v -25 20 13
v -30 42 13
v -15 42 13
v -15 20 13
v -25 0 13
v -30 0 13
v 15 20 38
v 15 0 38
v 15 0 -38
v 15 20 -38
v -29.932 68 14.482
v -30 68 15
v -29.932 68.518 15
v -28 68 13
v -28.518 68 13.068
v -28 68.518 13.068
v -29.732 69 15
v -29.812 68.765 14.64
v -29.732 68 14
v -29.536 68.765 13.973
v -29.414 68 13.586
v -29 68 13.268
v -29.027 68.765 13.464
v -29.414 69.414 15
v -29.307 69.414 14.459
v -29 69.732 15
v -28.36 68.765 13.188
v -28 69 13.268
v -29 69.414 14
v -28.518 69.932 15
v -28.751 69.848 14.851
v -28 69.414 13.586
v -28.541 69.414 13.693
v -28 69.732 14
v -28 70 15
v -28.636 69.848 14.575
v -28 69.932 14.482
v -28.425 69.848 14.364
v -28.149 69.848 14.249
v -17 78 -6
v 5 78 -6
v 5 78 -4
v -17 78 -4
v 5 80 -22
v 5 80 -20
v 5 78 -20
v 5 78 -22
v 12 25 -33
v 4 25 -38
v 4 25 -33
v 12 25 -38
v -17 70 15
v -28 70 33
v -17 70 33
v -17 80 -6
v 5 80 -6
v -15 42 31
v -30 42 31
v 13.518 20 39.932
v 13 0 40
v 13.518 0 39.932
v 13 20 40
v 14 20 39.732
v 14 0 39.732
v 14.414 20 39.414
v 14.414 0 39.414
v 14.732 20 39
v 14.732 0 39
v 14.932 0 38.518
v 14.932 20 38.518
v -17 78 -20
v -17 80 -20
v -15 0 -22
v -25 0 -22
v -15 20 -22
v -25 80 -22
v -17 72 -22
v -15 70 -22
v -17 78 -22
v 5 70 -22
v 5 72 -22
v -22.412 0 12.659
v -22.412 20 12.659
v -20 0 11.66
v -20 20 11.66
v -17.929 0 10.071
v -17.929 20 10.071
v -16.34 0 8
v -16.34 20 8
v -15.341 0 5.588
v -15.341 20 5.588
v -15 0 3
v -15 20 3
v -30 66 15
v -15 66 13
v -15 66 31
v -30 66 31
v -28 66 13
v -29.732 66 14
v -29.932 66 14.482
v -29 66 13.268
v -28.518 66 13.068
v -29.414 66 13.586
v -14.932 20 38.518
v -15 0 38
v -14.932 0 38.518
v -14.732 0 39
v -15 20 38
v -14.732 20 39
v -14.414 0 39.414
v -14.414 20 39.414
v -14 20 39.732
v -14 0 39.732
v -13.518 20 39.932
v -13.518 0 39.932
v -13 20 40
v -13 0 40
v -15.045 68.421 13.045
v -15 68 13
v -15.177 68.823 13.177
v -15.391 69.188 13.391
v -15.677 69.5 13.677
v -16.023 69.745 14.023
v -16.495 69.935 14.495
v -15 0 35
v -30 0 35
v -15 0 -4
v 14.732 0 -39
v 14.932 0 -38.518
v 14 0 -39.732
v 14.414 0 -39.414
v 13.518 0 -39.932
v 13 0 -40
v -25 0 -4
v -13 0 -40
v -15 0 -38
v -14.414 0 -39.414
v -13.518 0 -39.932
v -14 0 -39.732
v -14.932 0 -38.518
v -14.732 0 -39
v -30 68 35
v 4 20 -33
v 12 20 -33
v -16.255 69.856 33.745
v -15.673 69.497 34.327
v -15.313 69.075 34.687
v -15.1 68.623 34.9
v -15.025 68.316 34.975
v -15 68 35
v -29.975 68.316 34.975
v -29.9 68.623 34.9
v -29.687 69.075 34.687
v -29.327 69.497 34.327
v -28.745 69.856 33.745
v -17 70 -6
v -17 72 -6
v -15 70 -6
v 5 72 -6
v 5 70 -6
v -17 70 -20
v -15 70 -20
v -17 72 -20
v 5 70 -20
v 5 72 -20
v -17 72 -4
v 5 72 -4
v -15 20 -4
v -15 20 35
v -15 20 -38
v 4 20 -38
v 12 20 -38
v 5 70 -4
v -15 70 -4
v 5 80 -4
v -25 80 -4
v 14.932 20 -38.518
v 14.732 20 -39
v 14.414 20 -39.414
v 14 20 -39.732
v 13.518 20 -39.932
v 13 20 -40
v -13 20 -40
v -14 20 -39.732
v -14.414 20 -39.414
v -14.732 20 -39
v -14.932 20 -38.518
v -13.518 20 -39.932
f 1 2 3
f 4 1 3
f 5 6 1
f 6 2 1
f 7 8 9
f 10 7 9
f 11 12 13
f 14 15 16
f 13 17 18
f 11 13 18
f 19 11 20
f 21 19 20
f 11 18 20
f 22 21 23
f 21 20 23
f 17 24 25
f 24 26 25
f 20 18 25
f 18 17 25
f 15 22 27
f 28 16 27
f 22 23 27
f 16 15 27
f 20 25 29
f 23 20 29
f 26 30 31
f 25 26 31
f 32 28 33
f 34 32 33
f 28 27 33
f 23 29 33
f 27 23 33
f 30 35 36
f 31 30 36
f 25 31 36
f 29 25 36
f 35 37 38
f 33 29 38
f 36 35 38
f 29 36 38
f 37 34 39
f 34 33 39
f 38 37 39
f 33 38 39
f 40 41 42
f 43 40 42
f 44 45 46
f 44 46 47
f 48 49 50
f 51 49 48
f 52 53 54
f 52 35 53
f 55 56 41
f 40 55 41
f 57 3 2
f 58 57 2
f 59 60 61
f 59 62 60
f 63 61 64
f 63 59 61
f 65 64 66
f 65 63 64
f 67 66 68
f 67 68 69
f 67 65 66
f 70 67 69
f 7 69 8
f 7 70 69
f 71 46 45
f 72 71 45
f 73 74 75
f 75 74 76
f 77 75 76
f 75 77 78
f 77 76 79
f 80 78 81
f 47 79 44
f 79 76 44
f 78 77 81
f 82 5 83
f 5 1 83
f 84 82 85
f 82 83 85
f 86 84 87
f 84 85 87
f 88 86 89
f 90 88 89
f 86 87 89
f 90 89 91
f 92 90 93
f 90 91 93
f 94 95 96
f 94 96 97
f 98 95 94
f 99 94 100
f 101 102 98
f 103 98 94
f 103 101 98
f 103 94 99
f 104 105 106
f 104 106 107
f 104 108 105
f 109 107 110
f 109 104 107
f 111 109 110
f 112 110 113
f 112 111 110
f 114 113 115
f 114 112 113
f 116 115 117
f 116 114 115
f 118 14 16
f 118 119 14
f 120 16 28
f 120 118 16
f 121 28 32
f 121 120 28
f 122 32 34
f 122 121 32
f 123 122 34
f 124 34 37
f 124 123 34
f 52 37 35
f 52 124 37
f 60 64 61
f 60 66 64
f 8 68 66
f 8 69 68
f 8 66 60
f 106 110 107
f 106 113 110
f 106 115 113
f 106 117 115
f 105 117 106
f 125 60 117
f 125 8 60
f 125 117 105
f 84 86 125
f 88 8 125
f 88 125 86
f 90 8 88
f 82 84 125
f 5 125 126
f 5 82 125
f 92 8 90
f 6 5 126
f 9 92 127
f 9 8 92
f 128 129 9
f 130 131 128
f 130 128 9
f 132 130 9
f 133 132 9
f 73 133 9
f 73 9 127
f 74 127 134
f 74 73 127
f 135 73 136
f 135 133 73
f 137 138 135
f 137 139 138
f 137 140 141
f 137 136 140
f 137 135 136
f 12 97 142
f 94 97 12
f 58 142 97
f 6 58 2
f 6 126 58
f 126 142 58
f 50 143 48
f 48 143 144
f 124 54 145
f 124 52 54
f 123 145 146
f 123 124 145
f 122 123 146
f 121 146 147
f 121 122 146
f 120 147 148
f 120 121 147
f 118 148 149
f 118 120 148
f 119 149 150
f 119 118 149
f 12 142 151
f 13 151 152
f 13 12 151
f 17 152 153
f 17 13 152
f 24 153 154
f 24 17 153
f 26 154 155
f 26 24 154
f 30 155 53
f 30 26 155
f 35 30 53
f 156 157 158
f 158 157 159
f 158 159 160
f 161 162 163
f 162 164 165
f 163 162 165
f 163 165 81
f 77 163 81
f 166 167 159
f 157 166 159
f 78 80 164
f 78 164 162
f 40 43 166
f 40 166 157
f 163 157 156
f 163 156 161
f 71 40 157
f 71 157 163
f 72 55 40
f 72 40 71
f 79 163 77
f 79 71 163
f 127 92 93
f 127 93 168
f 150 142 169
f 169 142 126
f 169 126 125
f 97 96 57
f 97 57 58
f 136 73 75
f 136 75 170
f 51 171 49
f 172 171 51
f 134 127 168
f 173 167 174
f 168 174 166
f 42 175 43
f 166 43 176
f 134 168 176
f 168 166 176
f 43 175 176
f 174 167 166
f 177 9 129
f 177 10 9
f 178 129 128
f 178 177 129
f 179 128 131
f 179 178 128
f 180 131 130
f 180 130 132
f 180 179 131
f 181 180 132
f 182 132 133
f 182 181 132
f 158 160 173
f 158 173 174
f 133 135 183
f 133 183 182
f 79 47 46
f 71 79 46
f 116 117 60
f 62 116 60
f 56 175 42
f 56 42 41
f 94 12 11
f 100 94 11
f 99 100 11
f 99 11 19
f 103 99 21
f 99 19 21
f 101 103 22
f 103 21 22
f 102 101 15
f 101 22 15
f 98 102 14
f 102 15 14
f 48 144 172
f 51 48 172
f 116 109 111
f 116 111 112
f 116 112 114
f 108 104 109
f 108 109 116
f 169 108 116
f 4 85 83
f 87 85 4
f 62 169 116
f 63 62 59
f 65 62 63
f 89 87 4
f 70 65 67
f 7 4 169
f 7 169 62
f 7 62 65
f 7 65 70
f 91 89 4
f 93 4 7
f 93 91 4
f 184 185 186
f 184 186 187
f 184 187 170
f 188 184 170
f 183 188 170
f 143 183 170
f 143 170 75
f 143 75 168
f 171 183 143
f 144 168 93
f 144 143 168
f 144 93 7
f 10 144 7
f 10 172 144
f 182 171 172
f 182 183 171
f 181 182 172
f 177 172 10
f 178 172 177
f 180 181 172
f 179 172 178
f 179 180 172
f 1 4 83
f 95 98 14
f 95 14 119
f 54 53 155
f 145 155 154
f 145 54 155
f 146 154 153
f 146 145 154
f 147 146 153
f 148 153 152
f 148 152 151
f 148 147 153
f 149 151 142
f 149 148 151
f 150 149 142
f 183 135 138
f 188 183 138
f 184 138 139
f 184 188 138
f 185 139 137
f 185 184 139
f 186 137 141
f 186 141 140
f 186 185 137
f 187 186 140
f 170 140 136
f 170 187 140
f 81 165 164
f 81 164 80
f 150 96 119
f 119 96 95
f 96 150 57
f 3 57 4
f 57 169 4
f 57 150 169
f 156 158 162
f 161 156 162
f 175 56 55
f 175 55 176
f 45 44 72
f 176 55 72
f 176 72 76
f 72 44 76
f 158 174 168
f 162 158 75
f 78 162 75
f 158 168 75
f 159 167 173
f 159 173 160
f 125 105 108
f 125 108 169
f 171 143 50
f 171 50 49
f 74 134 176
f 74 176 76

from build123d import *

# Parameters (mm, degrees)
SKETCH5_W            = 30
SKETCH5_H            = 80
BOSS_EXTRUDE4_DEPTH  = 20
SKETCH6_W            = 8
SKETCH6_H            = 5
BOSS_EXTRUDE5_DEPTH  = 5
SKETCH9_W            = 15
SKETCH9_H            = 22
BOSS_EXTRUDE10_DEPTH = 70
SKETCH14_W           = 15
SKETCH14_H           = 24
CUT_EXTRUDE1_DEPTH   = 18
FILLET1_R            = 2
FILLET2_R            = 10
FILLET4_R            = 2
FILLET6_R            = 2
SKETCH18_W           = 10
SKETCH18_H           = 18
BOSS_EXTRUDE11_DEPTH = 80
BOSS_EXTRUDE12_DEPTH = 10
CUT_EXTRUDE4_DEPTH   = 22


with BuildPart() as part:
    # Sketch5 → Boss-Extrude4 (new body)
    with BuildSketch(Plane(origin=(0, 0, 0), x_dir=(1, 0, 0), z_dir=(0, 1, 0))):
        Rectangle(SKETCH5_W, SKETCH5_H)
    extrude(amount=BOSS_EXTRUDE4_DEPTH)

    # Sketch6 → Boss-Extrude5 (add)
    with BuildSketch(Plane(origin=(0, 20, 0), x_dir=(1, 0, 0), z_dir=(0, 1, 0))):
        with Locations((8, 35.5)):
            Rectangle(SKETCH6_W, SKETCH6_H)
    extrude(amount=BOSS_EXTRUDE5_DEPTH)

    # Sketch9 → Boss-Extrude10 (add)
    with BuildSketch(Plane(origin=(0, 0, 0), x_dir=(1, 0, 0), z_dir=(0, 1, 0))):
        with Locations((-22.5, -24)):
            Rectangle(SKETCH9_W, SKETCH9_H)
    extrude(amount=BOSS_EXTRUDE10_DEPTH)

    # Sketch14 → Cut-Extrude1 (cut)
    with BuildSketch(Plane(origin=(0, 0, 13), x_dir=(-1, 0, 0), z_dir=(0, 0, -1))):
        with Locations((22.5, 54)):
            Rectangle(SKETCH14_W, SKETCH14_H)
    extrude(amount=-CUT_EXTRUDE1_DEPTH, mode=Mode.SUBTRACT)

    # Fillet1
    fillet1_edges = [part.edges().sort_by_distance(p)[0] for p in [
        (-15, 10, -40),
        (15, 10, -40),
        (15, 10, 40),
        (-15, 10, 40),
    ]]
    fillet(fillet1_edges, radius=FILLET1_R)

    # Fillet2
    fillet2_edges = [part.edges().sort_by_distance(p)[0] for p in [
        (-15, 10, 13),
    ]]
    fillet(fillet2_edges, radius=FILLET2_R)

    # Fillet4
    fillet4_edges = [part.edges().sort_by_distance(p)[0] for p in [
        (-30, 68, 13),
    ]]
    fillet(fillet4_edges, radius=FILLET4_R)

    # Fillet6
    fillet6_edges = [part.edges().sort_by_distance(p)[0] for p in [
        (-22.5, 70, 35),
        (-30, 70, 25),
        (-15, 70, 24),
        (-21.5, 70, 13),
        (-29.414213562, 70, 13.585786438),
    ]]
    fillet(fillet6_edges, radius=FILLET6_R)

    # Sketch18 → Boss-Extrude11 (add)
    with BuildSketch(Plane(origin=(0, 0, 0), x_dir=(-1, 0, 0), z_dir=(0, -1, 0))):
        with Locations((20, 13)):
            Rectangle(SKETCH18_W, SKETCH18_H)
    extrude(amount=-BOSS_EXTRUDE11_DEPTH)

    # Sketch19 → Boss-Extrude12 (add)
    with BuildSketch(Plane(origin=(0, 80, 0), x_dir=(1, 0, 0), z_dir=(0, 1, 0))):
        Polygon((-15, 22), (5, 22), (5, 14.741263634), (5, 6.741263634), (5, 4), (-15, 4), (-15, 6.741263634), (-15, 14.741263634), align=None)
    extrude(amount=-BOSS_EXTRUDE12_DEPTH)

    # Sketch20 → Cut-Extrude4 (cut)
    with BuildSketch(Plane(origin=(5, 0, 0), x_dir=(0, 0, -1), z_dir=(1, 0, 0))):
        Polygon((20, 80), (6, 80), (6, 78), (4, 78), (4, 72), (6, 72), (6, 70), (20, 70), (20, 72), (22, 72), (22, 78), (20, 78), align=None)
    extrude(amount=-CUT_EXTRUDE4_DEPTH, mode=Mode.SUBTRACT)


solid = part.part
